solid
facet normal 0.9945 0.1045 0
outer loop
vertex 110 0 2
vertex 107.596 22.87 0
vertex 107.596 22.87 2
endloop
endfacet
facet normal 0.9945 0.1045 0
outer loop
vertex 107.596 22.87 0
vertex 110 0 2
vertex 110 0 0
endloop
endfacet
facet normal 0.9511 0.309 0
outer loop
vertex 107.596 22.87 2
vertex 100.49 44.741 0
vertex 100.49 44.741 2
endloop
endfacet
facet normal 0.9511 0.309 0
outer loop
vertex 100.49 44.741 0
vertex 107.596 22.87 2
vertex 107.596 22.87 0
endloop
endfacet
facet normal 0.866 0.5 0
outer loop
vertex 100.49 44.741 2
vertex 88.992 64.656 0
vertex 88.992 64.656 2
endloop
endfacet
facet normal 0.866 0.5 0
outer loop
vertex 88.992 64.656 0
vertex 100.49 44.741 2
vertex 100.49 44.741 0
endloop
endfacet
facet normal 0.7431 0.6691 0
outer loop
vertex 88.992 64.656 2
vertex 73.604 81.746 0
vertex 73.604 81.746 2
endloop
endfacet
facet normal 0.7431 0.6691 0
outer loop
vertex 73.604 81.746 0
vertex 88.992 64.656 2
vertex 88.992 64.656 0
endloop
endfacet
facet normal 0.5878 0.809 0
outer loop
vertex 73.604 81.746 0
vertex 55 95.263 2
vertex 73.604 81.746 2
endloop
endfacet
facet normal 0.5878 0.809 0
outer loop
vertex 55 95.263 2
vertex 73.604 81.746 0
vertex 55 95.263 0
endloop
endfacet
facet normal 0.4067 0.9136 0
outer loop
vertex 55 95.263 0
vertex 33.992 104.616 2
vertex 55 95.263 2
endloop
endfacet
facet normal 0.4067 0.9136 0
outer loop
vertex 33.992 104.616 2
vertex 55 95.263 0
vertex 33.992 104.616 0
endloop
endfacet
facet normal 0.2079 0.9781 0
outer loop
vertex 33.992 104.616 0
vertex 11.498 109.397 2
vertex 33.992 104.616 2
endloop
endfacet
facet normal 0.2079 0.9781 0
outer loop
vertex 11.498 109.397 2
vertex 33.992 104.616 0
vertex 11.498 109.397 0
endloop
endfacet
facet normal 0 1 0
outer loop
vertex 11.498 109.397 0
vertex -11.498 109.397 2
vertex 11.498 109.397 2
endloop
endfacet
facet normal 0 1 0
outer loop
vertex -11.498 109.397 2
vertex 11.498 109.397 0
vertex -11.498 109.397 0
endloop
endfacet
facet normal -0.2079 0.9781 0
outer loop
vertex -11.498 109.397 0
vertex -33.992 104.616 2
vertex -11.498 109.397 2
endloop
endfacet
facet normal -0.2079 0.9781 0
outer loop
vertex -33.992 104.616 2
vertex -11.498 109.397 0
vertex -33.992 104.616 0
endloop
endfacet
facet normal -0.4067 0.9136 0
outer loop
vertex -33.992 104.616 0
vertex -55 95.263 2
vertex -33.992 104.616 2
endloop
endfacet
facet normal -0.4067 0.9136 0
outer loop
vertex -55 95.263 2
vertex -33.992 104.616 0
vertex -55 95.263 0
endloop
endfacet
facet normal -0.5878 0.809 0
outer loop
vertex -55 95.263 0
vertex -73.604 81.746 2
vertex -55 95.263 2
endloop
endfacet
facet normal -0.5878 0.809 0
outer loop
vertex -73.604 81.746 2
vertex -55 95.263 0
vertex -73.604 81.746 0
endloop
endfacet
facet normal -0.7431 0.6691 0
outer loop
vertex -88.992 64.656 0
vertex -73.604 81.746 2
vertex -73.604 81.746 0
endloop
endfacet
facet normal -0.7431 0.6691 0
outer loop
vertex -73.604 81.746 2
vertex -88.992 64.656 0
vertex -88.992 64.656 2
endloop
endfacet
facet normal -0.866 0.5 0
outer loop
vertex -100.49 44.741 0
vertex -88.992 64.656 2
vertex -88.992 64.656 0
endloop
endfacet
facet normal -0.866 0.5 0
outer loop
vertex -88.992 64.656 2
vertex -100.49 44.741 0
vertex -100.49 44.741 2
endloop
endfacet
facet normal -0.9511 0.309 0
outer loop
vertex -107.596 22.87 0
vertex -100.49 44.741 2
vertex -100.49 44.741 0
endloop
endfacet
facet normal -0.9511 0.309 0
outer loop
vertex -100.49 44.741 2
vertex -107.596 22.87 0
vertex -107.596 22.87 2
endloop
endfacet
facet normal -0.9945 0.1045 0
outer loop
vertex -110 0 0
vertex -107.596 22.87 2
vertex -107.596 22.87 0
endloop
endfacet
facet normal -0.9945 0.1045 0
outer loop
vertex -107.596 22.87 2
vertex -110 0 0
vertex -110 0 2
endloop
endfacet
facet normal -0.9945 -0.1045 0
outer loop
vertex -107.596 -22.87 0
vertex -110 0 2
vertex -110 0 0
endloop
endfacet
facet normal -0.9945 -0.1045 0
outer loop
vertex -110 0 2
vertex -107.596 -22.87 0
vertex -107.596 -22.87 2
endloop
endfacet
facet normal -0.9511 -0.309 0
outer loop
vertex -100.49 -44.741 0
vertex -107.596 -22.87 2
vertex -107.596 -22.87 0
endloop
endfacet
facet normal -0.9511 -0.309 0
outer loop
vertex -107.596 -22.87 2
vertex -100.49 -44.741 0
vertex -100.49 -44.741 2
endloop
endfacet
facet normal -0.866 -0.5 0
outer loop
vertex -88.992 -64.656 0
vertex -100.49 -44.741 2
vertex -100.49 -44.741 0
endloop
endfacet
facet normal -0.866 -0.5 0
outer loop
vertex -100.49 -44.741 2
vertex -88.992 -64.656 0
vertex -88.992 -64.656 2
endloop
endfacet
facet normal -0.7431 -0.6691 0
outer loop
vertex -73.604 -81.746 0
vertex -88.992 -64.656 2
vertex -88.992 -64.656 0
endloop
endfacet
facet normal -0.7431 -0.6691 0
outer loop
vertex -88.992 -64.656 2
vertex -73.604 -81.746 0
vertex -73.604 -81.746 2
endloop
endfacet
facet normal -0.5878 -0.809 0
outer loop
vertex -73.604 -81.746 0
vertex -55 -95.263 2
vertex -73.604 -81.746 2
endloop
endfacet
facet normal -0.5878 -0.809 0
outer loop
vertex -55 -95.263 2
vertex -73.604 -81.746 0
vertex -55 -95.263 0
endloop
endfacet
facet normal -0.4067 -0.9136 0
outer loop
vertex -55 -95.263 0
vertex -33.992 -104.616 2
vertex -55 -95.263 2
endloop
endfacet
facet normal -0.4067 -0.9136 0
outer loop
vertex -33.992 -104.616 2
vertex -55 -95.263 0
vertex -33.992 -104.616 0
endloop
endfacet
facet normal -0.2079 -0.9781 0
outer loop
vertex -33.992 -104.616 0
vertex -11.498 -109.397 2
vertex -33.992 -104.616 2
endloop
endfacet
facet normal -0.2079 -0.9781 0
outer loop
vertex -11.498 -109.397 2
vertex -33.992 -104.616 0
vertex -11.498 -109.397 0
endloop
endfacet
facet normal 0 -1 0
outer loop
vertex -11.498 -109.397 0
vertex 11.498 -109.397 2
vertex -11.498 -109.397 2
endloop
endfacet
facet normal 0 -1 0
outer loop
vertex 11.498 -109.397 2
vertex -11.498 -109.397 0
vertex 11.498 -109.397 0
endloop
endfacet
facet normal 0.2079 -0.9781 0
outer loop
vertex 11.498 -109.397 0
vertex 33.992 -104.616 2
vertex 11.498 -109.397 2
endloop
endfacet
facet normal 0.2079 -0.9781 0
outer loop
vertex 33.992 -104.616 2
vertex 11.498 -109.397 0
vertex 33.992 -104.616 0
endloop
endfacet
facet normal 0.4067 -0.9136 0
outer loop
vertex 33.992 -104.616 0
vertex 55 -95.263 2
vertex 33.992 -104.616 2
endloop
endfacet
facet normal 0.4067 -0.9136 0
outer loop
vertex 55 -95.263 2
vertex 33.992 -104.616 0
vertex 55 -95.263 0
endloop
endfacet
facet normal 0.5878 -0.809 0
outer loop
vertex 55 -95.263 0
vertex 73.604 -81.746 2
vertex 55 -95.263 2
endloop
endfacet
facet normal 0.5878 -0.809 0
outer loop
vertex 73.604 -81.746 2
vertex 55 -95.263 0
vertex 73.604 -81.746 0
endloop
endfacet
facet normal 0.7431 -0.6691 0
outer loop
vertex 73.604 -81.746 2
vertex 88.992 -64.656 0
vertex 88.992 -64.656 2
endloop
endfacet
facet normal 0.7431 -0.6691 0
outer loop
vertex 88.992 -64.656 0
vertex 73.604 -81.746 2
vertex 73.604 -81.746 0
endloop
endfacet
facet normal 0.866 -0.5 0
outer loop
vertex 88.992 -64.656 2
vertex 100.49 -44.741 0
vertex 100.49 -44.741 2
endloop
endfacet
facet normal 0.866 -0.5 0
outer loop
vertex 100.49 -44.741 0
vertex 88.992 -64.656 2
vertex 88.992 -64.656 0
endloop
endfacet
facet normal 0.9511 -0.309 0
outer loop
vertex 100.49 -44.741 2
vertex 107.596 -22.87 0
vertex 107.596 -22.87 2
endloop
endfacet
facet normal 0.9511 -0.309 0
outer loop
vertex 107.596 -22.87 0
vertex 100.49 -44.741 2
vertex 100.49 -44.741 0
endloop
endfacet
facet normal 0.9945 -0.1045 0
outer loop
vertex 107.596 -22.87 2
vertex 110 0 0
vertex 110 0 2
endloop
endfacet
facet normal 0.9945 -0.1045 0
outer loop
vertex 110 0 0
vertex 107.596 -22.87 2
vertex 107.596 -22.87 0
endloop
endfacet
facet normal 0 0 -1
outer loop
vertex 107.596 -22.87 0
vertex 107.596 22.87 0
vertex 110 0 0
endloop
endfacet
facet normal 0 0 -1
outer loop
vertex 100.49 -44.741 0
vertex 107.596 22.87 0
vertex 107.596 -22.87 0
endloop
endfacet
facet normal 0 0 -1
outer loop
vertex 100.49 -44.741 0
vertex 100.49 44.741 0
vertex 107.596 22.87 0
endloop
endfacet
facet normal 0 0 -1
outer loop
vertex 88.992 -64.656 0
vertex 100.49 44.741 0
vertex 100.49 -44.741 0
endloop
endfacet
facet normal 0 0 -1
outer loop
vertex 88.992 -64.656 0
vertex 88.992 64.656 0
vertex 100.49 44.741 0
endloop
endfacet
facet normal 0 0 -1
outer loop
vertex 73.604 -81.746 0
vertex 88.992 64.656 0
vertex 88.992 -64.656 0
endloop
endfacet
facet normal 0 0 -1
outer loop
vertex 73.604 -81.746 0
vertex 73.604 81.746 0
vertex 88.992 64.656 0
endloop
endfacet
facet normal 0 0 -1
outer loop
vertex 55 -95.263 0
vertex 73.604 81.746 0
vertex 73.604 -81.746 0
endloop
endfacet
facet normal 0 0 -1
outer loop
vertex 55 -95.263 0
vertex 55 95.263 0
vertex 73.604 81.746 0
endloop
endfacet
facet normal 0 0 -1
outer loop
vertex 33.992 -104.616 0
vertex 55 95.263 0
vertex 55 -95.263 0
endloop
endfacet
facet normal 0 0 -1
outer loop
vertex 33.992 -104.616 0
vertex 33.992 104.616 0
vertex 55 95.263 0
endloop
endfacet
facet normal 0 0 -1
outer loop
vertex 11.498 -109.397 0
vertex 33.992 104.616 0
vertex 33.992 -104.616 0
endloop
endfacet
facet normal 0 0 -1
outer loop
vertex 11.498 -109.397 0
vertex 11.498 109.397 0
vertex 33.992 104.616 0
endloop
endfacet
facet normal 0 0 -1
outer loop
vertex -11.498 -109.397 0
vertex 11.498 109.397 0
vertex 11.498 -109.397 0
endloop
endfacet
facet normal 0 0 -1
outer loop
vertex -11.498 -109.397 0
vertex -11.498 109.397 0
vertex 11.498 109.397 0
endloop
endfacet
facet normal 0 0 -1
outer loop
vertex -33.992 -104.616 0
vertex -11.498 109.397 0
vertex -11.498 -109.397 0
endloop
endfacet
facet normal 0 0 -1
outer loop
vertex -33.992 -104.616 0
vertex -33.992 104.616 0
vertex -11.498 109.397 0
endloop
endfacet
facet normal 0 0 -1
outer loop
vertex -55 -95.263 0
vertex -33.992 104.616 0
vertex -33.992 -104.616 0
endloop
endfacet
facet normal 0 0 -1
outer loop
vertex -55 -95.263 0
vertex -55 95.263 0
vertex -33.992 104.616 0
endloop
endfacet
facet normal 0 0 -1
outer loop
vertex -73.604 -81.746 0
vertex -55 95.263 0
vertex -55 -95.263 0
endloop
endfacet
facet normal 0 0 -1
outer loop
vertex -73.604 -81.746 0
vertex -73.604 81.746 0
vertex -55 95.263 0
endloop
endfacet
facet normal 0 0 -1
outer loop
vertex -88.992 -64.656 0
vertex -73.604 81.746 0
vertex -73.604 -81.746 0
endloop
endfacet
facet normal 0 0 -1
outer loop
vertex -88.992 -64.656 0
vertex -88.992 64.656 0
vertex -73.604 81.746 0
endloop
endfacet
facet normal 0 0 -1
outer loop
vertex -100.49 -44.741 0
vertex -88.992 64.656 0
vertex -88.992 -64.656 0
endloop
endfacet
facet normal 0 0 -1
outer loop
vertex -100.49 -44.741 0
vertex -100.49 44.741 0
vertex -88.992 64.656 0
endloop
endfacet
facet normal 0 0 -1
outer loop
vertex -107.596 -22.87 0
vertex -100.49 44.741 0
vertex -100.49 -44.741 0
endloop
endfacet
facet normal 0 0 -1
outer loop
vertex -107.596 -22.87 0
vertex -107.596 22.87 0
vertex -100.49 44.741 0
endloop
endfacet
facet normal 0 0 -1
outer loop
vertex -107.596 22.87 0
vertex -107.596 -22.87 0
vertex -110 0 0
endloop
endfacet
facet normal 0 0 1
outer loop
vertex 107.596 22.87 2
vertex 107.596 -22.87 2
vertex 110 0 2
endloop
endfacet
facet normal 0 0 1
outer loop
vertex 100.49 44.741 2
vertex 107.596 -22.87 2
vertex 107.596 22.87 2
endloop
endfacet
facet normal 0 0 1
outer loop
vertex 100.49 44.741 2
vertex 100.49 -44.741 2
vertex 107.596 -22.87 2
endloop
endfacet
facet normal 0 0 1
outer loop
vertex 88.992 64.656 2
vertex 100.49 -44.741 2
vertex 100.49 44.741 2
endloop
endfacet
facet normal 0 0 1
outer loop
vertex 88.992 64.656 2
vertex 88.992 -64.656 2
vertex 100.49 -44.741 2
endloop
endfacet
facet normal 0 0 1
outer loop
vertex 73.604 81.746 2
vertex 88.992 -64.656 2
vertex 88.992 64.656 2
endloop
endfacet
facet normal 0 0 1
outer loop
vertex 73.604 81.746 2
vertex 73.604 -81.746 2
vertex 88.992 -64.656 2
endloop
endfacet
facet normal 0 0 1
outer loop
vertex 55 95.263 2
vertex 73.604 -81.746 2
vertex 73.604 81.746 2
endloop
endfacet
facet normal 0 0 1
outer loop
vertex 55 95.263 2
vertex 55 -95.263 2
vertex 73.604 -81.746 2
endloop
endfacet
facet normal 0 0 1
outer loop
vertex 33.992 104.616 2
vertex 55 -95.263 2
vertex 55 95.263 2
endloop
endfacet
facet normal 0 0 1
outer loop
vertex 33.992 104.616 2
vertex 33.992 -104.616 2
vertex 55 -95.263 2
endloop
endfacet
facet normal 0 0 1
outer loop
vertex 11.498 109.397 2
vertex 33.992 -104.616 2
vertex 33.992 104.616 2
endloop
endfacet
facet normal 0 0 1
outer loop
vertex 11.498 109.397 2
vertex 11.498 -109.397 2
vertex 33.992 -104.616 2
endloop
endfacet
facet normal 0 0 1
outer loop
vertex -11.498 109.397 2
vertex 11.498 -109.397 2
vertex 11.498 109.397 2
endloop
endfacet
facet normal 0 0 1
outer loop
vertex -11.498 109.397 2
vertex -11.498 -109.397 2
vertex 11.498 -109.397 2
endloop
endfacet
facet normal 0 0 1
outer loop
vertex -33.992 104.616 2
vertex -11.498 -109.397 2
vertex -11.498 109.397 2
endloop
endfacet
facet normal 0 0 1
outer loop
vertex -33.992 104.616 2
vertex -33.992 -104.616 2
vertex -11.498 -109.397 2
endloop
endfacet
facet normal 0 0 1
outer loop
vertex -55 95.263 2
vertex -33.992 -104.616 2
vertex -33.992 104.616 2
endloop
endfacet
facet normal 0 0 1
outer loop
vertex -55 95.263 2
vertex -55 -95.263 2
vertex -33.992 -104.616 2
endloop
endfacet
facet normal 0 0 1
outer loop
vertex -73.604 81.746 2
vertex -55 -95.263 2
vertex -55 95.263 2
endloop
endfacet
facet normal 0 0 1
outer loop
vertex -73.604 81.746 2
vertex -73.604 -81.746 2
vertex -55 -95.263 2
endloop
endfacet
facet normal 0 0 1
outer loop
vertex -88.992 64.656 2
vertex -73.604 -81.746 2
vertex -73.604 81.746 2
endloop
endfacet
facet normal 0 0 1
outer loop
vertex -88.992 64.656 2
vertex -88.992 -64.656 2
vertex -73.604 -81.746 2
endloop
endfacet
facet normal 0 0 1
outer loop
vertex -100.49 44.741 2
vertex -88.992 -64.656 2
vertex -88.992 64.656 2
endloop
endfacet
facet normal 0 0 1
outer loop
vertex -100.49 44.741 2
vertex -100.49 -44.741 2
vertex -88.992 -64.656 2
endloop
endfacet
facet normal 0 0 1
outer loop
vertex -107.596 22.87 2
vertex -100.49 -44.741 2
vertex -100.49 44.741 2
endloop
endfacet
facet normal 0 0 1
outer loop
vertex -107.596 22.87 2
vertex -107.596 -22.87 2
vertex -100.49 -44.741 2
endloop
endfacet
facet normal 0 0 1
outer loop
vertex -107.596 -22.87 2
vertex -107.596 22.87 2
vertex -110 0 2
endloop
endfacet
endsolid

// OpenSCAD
// Protractor for measuring paddle angle
// Michał Mikołajczyk michal@mikolajczyk.link

inner_r = 90;
outer_r = 110;
thickness = 2;
$fn = 30;

cylinder( h = thickness, r = outer_r );
